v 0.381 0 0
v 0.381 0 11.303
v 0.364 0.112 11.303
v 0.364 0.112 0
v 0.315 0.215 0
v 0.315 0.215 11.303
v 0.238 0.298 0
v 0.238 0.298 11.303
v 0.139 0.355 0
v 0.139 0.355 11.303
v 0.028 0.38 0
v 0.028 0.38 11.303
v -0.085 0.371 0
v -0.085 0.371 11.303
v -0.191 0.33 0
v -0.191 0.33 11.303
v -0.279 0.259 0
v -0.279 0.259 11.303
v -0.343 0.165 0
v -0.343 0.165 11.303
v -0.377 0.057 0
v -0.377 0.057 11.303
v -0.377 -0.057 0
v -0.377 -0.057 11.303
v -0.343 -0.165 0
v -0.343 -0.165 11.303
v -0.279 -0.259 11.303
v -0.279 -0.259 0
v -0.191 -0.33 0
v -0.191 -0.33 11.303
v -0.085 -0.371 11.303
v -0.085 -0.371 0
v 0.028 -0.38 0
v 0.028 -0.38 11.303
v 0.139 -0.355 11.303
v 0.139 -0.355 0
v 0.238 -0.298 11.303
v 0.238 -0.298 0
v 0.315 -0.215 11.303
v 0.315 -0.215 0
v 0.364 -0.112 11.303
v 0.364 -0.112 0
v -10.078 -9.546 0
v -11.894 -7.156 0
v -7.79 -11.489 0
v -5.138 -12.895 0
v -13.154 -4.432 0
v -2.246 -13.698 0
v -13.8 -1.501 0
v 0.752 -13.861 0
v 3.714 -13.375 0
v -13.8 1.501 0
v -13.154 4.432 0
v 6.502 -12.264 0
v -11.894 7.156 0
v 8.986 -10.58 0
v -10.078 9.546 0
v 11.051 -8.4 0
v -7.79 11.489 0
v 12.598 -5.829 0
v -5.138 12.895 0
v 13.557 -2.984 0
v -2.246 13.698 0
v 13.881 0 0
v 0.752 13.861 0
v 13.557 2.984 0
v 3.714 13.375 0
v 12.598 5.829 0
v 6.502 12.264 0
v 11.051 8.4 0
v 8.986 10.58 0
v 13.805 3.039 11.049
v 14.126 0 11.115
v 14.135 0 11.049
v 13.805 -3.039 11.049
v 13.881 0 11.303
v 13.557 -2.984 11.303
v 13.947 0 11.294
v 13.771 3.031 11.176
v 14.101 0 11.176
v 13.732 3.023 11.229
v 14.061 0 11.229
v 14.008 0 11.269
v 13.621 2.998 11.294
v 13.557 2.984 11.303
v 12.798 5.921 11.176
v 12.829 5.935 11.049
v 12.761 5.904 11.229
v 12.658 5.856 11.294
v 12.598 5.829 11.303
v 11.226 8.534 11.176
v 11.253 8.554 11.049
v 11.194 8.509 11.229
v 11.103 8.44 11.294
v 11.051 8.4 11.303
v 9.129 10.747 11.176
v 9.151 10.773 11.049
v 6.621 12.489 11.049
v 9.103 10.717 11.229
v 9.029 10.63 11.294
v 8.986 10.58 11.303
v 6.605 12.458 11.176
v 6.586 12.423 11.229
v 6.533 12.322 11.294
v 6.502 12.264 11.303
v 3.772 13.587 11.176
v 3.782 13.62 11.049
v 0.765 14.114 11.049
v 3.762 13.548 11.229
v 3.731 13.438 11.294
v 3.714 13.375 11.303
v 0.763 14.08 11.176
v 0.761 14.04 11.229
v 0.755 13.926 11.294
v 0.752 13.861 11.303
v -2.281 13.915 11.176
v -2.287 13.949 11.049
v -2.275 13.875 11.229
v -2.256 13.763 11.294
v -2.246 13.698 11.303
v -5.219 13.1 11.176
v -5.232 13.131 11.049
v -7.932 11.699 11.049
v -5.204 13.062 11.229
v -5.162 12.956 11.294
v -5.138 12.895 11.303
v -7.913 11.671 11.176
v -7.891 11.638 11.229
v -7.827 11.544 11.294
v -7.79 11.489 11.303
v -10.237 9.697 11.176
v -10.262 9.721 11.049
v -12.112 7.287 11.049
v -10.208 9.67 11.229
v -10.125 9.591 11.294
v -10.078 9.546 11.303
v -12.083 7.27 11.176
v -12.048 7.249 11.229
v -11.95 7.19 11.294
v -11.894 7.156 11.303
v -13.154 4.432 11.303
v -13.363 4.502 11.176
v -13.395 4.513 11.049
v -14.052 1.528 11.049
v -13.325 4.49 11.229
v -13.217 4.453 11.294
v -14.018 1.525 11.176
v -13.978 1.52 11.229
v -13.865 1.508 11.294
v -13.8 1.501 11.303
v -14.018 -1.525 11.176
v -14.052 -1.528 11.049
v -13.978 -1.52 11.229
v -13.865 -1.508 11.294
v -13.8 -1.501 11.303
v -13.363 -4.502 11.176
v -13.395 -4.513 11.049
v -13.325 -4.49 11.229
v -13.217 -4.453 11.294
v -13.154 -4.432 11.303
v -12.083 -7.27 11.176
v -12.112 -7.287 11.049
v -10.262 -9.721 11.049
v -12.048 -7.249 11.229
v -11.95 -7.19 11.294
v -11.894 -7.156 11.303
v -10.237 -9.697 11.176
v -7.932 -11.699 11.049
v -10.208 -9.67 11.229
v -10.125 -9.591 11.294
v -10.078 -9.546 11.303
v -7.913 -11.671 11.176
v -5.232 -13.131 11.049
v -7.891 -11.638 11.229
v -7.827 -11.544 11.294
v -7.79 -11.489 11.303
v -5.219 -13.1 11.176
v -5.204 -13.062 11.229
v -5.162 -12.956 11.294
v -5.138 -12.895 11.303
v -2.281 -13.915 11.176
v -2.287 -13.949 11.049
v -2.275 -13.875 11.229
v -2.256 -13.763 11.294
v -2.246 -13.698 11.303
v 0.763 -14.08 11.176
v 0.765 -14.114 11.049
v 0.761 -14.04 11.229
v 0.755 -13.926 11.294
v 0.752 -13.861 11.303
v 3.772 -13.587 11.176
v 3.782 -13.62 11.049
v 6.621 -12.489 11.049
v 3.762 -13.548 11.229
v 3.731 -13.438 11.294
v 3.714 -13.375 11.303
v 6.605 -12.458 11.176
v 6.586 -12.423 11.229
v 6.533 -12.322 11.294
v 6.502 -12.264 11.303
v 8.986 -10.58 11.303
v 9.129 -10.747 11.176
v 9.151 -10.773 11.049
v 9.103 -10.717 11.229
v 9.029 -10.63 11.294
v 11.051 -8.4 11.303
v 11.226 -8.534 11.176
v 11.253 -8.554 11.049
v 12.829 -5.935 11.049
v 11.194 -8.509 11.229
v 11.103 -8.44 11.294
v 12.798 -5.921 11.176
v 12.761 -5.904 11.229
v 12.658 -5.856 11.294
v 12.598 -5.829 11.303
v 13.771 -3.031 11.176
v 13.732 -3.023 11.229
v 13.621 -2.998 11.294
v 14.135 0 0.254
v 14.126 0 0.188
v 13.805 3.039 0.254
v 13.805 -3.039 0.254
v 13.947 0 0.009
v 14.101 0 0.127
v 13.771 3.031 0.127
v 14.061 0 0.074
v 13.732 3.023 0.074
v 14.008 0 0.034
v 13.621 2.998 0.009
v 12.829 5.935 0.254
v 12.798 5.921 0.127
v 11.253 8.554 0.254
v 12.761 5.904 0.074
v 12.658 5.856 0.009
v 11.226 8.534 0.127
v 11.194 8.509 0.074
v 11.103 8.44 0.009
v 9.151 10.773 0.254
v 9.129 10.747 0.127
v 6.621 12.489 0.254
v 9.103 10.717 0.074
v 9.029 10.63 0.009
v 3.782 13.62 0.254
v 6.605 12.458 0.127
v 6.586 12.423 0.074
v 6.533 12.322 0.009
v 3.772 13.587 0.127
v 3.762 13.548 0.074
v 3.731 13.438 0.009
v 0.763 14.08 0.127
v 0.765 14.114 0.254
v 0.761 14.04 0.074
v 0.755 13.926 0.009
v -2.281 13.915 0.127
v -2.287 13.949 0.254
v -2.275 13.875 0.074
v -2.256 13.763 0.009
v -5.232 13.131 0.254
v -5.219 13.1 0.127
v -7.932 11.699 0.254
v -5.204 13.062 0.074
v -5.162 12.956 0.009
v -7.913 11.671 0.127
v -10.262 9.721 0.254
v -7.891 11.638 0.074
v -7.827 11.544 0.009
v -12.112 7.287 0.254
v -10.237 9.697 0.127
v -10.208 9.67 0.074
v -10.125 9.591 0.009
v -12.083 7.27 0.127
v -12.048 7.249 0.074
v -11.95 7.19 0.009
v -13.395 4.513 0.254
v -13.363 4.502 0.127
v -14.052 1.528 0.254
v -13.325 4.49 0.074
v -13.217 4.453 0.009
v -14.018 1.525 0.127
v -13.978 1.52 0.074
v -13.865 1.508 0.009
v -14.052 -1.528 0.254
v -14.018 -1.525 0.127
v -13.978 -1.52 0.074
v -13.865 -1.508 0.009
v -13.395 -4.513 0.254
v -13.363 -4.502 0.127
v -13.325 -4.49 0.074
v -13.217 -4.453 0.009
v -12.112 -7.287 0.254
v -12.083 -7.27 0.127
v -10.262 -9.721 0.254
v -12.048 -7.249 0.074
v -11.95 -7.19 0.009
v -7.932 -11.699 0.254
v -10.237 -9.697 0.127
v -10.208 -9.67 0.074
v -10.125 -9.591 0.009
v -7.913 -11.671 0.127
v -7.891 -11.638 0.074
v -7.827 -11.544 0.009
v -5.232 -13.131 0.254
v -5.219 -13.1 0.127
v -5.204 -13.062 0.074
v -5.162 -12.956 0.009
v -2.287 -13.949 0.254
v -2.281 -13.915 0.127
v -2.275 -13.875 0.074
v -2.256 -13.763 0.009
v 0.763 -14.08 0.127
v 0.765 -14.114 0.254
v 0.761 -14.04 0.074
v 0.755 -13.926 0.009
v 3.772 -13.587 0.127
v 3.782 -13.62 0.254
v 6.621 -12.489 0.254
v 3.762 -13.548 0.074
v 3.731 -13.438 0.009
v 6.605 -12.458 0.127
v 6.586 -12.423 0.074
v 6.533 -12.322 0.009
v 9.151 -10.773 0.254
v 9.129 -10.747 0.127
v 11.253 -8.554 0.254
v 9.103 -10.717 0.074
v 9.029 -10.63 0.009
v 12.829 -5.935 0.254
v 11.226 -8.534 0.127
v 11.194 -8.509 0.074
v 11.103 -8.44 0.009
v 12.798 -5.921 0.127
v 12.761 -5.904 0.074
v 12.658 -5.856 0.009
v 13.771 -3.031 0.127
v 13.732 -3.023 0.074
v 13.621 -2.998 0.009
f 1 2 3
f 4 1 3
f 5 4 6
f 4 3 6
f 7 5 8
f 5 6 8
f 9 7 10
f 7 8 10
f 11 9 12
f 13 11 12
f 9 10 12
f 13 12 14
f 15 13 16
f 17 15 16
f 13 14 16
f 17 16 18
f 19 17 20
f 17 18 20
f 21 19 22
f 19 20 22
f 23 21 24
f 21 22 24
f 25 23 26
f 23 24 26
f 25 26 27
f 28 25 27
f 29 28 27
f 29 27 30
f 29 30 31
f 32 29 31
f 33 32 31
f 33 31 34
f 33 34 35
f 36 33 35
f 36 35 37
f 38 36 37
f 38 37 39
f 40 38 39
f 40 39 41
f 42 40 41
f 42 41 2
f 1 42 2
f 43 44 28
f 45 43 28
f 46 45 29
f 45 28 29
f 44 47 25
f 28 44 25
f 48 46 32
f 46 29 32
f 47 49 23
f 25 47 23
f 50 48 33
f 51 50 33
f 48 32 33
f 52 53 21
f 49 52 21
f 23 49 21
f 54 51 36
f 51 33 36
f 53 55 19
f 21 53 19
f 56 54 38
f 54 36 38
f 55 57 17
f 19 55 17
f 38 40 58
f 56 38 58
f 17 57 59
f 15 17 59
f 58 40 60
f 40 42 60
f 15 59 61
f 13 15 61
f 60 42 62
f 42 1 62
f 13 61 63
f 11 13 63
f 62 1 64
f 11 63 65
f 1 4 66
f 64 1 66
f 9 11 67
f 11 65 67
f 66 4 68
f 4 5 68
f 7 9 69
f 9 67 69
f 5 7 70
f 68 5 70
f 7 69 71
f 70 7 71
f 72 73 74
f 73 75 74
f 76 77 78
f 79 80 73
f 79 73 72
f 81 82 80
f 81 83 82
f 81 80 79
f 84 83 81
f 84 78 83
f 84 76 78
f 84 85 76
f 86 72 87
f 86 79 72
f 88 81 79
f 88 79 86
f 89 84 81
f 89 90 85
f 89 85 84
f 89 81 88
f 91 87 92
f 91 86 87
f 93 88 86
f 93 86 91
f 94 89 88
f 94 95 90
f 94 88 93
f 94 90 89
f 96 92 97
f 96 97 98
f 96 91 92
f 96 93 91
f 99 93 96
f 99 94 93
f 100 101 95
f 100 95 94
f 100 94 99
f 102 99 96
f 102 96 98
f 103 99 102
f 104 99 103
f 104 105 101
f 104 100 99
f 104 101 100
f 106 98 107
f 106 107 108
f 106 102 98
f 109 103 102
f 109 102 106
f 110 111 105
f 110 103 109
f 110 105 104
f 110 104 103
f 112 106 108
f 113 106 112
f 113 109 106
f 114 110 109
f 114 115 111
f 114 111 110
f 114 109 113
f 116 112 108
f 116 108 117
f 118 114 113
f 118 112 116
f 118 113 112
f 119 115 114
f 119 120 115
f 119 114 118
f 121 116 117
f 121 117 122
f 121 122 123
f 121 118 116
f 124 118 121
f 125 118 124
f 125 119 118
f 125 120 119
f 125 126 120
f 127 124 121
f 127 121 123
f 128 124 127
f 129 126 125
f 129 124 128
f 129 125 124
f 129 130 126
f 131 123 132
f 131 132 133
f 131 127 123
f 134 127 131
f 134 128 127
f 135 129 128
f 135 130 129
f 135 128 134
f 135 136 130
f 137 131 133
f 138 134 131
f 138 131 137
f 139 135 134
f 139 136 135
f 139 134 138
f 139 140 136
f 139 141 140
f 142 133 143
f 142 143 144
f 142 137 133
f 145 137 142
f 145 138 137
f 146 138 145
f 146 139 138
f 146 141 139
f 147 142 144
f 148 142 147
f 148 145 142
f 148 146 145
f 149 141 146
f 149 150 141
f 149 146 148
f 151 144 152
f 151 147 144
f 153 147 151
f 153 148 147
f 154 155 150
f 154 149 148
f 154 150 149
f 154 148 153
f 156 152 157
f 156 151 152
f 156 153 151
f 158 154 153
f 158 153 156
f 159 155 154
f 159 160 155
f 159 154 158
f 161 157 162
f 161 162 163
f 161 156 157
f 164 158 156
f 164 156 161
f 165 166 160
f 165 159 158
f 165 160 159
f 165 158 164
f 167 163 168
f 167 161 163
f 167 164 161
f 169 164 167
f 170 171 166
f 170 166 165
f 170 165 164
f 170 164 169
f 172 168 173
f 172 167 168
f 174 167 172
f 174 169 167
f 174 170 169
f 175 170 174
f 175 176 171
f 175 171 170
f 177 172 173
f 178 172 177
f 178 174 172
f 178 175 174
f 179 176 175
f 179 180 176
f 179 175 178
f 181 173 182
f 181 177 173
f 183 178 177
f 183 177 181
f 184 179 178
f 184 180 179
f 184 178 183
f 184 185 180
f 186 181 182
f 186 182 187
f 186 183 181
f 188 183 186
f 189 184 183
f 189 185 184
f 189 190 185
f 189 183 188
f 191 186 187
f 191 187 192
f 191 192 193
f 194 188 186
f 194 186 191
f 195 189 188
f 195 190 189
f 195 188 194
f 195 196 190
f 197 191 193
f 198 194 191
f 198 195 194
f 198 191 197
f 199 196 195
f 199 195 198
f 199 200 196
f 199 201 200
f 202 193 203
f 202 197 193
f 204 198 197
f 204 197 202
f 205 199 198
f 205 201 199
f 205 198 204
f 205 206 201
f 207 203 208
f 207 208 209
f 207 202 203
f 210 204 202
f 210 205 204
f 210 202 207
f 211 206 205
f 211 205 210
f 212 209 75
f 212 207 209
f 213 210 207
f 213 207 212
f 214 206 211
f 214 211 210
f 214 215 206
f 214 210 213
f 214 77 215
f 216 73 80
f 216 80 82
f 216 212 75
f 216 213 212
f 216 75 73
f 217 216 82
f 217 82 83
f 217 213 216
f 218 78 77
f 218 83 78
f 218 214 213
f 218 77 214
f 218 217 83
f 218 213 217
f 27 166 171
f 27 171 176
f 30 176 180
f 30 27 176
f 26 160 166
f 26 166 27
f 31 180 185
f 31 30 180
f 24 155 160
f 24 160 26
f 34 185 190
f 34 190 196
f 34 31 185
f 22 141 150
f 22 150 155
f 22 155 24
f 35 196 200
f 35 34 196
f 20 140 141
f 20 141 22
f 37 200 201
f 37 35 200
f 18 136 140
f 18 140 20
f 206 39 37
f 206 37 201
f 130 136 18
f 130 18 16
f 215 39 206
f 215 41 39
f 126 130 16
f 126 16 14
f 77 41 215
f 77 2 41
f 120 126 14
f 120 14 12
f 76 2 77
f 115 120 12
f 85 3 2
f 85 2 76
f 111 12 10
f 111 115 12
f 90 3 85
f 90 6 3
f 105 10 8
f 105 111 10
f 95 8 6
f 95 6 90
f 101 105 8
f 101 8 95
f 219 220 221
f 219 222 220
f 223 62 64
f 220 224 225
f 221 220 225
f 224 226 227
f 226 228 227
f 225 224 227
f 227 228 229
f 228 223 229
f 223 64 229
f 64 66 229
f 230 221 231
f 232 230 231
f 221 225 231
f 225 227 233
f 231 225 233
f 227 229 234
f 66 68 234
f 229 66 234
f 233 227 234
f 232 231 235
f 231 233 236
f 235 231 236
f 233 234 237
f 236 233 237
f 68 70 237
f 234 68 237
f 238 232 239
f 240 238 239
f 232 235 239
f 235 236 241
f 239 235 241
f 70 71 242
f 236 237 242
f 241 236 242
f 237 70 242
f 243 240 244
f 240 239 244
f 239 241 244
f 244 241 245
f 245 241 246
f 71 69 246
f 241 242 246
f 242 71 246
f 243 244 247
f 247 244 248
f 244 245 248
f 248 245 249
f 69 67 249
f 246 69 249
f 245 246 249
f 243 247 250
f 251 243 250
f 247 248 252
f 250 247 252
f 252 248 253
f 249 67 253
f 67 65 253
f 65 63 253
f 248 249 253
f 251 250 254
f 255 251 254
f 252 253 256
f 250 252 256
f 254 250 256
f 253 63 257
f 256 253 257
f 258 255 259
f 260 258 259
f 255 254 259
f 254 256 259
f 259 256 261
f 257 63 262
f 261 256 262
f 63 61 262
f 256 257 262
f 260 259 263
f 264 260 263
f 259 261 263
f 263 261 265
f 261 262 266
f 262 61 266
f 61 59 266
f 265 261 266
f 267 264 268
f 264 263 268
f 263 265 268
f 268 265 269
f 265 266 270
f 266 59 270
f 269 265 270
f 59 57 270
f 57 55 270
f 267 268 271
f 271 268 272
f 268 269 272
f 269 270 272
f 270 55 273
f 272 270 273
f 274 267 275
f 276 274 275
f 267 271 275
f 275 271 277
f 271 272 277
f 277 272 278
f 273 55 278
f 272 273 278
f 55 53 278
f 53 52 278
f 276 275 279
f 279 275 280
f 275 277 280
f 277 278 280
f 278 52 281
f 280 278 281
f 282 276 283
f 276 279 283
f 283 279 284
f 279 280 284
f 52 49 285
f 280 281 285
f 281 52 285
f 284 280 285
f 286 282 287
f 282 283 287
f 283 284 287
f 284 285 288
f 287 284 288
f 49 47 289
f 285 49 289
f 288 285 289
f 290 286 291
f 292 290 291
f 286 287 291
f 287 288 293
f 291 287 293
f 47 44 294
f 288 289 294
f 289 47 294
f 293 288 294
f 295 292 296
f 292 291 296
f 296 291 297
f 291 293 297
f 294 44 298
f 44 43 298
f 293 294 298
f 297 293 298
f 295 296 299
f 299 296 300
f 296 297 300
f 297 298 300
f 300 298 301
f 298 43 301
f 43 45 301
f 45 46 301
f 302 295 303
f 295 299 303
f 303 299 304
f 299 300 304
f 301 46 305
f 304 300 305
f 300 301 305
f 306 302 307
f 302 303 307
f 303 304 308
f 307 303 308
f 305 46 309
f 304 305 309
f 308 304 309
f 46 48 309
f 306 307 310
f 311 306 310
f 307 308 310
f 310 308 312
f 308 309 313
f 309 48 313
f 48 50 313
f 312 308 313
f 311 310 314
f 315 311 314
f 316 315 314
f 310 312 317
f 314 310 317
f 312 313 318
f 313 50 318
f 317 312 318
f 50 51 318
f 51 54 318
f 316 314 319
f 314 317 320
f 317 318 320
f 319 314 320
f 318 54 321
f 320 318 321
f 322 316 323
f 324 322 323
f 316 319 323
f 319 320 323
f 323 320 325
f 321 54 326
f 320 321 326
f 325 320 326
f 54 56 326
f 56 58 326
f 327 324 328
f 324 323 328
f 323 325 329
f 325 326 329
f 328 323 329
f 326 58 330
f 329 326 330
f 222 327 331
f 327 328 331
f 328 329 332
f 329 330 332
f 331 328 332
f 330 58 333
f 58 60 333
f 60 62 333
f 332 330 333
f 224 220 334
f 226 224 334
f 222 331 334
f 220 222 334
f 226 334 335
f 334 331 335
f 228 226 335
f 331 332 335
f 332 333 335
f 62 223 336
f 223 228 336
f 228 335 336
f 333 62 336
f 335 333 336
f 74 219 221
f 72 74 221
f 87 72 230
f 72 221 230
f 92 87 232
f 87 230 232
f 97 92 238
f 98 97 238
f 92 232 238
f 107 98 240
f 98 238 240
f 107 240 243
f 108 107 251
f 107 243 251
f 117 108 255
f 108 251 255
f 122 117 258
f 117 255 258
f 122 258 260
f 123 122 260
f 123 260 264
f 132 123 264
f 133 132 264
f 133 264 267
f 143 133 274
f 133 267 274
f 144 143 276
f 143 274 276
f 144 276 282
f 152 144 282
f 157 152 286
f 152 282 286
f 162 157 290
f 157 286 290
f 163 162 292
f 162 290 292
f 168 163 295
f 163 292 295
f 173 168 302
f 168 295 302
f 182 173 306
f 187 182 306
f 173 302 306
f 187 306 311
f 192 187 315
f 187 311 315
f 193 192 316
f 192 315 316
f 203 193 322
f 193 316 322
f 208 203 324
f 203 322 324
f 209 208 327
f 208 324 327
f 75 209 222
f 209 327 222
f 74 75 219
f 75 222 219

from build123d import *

# Parameters (mm, degrees)
F0_R     = 14.1351
F1_DEPTH = 11.303
F2_R     = 0.254
F3_R     = 0.381
F4_DEPTH = 25.4


with BuildPart() as f1:
    # F0 (on Top) → F1 (new body)
    with BuildSketch(Plane.XY):
        Circle(F0_R)
    extrude(amount=F1_DEPTH)

    # F2
    f2_edges = [f1.edges().sort_by_distance(p)[0] for p in [
        (-14.1351, 0, 11.303),
        (-14.1351, 0, 0),
    ]]
    fillet(f2_edges, radius=F2_R)

    # F3 (on face) → F4 (cut)
    with BuildSketch(Plane.XY.offset(11.303)):
        Circle(F3_R)
    extrude(amount=-F4_DEPTH, mode=Mode.SUBTRACT)


solid = f1.part
